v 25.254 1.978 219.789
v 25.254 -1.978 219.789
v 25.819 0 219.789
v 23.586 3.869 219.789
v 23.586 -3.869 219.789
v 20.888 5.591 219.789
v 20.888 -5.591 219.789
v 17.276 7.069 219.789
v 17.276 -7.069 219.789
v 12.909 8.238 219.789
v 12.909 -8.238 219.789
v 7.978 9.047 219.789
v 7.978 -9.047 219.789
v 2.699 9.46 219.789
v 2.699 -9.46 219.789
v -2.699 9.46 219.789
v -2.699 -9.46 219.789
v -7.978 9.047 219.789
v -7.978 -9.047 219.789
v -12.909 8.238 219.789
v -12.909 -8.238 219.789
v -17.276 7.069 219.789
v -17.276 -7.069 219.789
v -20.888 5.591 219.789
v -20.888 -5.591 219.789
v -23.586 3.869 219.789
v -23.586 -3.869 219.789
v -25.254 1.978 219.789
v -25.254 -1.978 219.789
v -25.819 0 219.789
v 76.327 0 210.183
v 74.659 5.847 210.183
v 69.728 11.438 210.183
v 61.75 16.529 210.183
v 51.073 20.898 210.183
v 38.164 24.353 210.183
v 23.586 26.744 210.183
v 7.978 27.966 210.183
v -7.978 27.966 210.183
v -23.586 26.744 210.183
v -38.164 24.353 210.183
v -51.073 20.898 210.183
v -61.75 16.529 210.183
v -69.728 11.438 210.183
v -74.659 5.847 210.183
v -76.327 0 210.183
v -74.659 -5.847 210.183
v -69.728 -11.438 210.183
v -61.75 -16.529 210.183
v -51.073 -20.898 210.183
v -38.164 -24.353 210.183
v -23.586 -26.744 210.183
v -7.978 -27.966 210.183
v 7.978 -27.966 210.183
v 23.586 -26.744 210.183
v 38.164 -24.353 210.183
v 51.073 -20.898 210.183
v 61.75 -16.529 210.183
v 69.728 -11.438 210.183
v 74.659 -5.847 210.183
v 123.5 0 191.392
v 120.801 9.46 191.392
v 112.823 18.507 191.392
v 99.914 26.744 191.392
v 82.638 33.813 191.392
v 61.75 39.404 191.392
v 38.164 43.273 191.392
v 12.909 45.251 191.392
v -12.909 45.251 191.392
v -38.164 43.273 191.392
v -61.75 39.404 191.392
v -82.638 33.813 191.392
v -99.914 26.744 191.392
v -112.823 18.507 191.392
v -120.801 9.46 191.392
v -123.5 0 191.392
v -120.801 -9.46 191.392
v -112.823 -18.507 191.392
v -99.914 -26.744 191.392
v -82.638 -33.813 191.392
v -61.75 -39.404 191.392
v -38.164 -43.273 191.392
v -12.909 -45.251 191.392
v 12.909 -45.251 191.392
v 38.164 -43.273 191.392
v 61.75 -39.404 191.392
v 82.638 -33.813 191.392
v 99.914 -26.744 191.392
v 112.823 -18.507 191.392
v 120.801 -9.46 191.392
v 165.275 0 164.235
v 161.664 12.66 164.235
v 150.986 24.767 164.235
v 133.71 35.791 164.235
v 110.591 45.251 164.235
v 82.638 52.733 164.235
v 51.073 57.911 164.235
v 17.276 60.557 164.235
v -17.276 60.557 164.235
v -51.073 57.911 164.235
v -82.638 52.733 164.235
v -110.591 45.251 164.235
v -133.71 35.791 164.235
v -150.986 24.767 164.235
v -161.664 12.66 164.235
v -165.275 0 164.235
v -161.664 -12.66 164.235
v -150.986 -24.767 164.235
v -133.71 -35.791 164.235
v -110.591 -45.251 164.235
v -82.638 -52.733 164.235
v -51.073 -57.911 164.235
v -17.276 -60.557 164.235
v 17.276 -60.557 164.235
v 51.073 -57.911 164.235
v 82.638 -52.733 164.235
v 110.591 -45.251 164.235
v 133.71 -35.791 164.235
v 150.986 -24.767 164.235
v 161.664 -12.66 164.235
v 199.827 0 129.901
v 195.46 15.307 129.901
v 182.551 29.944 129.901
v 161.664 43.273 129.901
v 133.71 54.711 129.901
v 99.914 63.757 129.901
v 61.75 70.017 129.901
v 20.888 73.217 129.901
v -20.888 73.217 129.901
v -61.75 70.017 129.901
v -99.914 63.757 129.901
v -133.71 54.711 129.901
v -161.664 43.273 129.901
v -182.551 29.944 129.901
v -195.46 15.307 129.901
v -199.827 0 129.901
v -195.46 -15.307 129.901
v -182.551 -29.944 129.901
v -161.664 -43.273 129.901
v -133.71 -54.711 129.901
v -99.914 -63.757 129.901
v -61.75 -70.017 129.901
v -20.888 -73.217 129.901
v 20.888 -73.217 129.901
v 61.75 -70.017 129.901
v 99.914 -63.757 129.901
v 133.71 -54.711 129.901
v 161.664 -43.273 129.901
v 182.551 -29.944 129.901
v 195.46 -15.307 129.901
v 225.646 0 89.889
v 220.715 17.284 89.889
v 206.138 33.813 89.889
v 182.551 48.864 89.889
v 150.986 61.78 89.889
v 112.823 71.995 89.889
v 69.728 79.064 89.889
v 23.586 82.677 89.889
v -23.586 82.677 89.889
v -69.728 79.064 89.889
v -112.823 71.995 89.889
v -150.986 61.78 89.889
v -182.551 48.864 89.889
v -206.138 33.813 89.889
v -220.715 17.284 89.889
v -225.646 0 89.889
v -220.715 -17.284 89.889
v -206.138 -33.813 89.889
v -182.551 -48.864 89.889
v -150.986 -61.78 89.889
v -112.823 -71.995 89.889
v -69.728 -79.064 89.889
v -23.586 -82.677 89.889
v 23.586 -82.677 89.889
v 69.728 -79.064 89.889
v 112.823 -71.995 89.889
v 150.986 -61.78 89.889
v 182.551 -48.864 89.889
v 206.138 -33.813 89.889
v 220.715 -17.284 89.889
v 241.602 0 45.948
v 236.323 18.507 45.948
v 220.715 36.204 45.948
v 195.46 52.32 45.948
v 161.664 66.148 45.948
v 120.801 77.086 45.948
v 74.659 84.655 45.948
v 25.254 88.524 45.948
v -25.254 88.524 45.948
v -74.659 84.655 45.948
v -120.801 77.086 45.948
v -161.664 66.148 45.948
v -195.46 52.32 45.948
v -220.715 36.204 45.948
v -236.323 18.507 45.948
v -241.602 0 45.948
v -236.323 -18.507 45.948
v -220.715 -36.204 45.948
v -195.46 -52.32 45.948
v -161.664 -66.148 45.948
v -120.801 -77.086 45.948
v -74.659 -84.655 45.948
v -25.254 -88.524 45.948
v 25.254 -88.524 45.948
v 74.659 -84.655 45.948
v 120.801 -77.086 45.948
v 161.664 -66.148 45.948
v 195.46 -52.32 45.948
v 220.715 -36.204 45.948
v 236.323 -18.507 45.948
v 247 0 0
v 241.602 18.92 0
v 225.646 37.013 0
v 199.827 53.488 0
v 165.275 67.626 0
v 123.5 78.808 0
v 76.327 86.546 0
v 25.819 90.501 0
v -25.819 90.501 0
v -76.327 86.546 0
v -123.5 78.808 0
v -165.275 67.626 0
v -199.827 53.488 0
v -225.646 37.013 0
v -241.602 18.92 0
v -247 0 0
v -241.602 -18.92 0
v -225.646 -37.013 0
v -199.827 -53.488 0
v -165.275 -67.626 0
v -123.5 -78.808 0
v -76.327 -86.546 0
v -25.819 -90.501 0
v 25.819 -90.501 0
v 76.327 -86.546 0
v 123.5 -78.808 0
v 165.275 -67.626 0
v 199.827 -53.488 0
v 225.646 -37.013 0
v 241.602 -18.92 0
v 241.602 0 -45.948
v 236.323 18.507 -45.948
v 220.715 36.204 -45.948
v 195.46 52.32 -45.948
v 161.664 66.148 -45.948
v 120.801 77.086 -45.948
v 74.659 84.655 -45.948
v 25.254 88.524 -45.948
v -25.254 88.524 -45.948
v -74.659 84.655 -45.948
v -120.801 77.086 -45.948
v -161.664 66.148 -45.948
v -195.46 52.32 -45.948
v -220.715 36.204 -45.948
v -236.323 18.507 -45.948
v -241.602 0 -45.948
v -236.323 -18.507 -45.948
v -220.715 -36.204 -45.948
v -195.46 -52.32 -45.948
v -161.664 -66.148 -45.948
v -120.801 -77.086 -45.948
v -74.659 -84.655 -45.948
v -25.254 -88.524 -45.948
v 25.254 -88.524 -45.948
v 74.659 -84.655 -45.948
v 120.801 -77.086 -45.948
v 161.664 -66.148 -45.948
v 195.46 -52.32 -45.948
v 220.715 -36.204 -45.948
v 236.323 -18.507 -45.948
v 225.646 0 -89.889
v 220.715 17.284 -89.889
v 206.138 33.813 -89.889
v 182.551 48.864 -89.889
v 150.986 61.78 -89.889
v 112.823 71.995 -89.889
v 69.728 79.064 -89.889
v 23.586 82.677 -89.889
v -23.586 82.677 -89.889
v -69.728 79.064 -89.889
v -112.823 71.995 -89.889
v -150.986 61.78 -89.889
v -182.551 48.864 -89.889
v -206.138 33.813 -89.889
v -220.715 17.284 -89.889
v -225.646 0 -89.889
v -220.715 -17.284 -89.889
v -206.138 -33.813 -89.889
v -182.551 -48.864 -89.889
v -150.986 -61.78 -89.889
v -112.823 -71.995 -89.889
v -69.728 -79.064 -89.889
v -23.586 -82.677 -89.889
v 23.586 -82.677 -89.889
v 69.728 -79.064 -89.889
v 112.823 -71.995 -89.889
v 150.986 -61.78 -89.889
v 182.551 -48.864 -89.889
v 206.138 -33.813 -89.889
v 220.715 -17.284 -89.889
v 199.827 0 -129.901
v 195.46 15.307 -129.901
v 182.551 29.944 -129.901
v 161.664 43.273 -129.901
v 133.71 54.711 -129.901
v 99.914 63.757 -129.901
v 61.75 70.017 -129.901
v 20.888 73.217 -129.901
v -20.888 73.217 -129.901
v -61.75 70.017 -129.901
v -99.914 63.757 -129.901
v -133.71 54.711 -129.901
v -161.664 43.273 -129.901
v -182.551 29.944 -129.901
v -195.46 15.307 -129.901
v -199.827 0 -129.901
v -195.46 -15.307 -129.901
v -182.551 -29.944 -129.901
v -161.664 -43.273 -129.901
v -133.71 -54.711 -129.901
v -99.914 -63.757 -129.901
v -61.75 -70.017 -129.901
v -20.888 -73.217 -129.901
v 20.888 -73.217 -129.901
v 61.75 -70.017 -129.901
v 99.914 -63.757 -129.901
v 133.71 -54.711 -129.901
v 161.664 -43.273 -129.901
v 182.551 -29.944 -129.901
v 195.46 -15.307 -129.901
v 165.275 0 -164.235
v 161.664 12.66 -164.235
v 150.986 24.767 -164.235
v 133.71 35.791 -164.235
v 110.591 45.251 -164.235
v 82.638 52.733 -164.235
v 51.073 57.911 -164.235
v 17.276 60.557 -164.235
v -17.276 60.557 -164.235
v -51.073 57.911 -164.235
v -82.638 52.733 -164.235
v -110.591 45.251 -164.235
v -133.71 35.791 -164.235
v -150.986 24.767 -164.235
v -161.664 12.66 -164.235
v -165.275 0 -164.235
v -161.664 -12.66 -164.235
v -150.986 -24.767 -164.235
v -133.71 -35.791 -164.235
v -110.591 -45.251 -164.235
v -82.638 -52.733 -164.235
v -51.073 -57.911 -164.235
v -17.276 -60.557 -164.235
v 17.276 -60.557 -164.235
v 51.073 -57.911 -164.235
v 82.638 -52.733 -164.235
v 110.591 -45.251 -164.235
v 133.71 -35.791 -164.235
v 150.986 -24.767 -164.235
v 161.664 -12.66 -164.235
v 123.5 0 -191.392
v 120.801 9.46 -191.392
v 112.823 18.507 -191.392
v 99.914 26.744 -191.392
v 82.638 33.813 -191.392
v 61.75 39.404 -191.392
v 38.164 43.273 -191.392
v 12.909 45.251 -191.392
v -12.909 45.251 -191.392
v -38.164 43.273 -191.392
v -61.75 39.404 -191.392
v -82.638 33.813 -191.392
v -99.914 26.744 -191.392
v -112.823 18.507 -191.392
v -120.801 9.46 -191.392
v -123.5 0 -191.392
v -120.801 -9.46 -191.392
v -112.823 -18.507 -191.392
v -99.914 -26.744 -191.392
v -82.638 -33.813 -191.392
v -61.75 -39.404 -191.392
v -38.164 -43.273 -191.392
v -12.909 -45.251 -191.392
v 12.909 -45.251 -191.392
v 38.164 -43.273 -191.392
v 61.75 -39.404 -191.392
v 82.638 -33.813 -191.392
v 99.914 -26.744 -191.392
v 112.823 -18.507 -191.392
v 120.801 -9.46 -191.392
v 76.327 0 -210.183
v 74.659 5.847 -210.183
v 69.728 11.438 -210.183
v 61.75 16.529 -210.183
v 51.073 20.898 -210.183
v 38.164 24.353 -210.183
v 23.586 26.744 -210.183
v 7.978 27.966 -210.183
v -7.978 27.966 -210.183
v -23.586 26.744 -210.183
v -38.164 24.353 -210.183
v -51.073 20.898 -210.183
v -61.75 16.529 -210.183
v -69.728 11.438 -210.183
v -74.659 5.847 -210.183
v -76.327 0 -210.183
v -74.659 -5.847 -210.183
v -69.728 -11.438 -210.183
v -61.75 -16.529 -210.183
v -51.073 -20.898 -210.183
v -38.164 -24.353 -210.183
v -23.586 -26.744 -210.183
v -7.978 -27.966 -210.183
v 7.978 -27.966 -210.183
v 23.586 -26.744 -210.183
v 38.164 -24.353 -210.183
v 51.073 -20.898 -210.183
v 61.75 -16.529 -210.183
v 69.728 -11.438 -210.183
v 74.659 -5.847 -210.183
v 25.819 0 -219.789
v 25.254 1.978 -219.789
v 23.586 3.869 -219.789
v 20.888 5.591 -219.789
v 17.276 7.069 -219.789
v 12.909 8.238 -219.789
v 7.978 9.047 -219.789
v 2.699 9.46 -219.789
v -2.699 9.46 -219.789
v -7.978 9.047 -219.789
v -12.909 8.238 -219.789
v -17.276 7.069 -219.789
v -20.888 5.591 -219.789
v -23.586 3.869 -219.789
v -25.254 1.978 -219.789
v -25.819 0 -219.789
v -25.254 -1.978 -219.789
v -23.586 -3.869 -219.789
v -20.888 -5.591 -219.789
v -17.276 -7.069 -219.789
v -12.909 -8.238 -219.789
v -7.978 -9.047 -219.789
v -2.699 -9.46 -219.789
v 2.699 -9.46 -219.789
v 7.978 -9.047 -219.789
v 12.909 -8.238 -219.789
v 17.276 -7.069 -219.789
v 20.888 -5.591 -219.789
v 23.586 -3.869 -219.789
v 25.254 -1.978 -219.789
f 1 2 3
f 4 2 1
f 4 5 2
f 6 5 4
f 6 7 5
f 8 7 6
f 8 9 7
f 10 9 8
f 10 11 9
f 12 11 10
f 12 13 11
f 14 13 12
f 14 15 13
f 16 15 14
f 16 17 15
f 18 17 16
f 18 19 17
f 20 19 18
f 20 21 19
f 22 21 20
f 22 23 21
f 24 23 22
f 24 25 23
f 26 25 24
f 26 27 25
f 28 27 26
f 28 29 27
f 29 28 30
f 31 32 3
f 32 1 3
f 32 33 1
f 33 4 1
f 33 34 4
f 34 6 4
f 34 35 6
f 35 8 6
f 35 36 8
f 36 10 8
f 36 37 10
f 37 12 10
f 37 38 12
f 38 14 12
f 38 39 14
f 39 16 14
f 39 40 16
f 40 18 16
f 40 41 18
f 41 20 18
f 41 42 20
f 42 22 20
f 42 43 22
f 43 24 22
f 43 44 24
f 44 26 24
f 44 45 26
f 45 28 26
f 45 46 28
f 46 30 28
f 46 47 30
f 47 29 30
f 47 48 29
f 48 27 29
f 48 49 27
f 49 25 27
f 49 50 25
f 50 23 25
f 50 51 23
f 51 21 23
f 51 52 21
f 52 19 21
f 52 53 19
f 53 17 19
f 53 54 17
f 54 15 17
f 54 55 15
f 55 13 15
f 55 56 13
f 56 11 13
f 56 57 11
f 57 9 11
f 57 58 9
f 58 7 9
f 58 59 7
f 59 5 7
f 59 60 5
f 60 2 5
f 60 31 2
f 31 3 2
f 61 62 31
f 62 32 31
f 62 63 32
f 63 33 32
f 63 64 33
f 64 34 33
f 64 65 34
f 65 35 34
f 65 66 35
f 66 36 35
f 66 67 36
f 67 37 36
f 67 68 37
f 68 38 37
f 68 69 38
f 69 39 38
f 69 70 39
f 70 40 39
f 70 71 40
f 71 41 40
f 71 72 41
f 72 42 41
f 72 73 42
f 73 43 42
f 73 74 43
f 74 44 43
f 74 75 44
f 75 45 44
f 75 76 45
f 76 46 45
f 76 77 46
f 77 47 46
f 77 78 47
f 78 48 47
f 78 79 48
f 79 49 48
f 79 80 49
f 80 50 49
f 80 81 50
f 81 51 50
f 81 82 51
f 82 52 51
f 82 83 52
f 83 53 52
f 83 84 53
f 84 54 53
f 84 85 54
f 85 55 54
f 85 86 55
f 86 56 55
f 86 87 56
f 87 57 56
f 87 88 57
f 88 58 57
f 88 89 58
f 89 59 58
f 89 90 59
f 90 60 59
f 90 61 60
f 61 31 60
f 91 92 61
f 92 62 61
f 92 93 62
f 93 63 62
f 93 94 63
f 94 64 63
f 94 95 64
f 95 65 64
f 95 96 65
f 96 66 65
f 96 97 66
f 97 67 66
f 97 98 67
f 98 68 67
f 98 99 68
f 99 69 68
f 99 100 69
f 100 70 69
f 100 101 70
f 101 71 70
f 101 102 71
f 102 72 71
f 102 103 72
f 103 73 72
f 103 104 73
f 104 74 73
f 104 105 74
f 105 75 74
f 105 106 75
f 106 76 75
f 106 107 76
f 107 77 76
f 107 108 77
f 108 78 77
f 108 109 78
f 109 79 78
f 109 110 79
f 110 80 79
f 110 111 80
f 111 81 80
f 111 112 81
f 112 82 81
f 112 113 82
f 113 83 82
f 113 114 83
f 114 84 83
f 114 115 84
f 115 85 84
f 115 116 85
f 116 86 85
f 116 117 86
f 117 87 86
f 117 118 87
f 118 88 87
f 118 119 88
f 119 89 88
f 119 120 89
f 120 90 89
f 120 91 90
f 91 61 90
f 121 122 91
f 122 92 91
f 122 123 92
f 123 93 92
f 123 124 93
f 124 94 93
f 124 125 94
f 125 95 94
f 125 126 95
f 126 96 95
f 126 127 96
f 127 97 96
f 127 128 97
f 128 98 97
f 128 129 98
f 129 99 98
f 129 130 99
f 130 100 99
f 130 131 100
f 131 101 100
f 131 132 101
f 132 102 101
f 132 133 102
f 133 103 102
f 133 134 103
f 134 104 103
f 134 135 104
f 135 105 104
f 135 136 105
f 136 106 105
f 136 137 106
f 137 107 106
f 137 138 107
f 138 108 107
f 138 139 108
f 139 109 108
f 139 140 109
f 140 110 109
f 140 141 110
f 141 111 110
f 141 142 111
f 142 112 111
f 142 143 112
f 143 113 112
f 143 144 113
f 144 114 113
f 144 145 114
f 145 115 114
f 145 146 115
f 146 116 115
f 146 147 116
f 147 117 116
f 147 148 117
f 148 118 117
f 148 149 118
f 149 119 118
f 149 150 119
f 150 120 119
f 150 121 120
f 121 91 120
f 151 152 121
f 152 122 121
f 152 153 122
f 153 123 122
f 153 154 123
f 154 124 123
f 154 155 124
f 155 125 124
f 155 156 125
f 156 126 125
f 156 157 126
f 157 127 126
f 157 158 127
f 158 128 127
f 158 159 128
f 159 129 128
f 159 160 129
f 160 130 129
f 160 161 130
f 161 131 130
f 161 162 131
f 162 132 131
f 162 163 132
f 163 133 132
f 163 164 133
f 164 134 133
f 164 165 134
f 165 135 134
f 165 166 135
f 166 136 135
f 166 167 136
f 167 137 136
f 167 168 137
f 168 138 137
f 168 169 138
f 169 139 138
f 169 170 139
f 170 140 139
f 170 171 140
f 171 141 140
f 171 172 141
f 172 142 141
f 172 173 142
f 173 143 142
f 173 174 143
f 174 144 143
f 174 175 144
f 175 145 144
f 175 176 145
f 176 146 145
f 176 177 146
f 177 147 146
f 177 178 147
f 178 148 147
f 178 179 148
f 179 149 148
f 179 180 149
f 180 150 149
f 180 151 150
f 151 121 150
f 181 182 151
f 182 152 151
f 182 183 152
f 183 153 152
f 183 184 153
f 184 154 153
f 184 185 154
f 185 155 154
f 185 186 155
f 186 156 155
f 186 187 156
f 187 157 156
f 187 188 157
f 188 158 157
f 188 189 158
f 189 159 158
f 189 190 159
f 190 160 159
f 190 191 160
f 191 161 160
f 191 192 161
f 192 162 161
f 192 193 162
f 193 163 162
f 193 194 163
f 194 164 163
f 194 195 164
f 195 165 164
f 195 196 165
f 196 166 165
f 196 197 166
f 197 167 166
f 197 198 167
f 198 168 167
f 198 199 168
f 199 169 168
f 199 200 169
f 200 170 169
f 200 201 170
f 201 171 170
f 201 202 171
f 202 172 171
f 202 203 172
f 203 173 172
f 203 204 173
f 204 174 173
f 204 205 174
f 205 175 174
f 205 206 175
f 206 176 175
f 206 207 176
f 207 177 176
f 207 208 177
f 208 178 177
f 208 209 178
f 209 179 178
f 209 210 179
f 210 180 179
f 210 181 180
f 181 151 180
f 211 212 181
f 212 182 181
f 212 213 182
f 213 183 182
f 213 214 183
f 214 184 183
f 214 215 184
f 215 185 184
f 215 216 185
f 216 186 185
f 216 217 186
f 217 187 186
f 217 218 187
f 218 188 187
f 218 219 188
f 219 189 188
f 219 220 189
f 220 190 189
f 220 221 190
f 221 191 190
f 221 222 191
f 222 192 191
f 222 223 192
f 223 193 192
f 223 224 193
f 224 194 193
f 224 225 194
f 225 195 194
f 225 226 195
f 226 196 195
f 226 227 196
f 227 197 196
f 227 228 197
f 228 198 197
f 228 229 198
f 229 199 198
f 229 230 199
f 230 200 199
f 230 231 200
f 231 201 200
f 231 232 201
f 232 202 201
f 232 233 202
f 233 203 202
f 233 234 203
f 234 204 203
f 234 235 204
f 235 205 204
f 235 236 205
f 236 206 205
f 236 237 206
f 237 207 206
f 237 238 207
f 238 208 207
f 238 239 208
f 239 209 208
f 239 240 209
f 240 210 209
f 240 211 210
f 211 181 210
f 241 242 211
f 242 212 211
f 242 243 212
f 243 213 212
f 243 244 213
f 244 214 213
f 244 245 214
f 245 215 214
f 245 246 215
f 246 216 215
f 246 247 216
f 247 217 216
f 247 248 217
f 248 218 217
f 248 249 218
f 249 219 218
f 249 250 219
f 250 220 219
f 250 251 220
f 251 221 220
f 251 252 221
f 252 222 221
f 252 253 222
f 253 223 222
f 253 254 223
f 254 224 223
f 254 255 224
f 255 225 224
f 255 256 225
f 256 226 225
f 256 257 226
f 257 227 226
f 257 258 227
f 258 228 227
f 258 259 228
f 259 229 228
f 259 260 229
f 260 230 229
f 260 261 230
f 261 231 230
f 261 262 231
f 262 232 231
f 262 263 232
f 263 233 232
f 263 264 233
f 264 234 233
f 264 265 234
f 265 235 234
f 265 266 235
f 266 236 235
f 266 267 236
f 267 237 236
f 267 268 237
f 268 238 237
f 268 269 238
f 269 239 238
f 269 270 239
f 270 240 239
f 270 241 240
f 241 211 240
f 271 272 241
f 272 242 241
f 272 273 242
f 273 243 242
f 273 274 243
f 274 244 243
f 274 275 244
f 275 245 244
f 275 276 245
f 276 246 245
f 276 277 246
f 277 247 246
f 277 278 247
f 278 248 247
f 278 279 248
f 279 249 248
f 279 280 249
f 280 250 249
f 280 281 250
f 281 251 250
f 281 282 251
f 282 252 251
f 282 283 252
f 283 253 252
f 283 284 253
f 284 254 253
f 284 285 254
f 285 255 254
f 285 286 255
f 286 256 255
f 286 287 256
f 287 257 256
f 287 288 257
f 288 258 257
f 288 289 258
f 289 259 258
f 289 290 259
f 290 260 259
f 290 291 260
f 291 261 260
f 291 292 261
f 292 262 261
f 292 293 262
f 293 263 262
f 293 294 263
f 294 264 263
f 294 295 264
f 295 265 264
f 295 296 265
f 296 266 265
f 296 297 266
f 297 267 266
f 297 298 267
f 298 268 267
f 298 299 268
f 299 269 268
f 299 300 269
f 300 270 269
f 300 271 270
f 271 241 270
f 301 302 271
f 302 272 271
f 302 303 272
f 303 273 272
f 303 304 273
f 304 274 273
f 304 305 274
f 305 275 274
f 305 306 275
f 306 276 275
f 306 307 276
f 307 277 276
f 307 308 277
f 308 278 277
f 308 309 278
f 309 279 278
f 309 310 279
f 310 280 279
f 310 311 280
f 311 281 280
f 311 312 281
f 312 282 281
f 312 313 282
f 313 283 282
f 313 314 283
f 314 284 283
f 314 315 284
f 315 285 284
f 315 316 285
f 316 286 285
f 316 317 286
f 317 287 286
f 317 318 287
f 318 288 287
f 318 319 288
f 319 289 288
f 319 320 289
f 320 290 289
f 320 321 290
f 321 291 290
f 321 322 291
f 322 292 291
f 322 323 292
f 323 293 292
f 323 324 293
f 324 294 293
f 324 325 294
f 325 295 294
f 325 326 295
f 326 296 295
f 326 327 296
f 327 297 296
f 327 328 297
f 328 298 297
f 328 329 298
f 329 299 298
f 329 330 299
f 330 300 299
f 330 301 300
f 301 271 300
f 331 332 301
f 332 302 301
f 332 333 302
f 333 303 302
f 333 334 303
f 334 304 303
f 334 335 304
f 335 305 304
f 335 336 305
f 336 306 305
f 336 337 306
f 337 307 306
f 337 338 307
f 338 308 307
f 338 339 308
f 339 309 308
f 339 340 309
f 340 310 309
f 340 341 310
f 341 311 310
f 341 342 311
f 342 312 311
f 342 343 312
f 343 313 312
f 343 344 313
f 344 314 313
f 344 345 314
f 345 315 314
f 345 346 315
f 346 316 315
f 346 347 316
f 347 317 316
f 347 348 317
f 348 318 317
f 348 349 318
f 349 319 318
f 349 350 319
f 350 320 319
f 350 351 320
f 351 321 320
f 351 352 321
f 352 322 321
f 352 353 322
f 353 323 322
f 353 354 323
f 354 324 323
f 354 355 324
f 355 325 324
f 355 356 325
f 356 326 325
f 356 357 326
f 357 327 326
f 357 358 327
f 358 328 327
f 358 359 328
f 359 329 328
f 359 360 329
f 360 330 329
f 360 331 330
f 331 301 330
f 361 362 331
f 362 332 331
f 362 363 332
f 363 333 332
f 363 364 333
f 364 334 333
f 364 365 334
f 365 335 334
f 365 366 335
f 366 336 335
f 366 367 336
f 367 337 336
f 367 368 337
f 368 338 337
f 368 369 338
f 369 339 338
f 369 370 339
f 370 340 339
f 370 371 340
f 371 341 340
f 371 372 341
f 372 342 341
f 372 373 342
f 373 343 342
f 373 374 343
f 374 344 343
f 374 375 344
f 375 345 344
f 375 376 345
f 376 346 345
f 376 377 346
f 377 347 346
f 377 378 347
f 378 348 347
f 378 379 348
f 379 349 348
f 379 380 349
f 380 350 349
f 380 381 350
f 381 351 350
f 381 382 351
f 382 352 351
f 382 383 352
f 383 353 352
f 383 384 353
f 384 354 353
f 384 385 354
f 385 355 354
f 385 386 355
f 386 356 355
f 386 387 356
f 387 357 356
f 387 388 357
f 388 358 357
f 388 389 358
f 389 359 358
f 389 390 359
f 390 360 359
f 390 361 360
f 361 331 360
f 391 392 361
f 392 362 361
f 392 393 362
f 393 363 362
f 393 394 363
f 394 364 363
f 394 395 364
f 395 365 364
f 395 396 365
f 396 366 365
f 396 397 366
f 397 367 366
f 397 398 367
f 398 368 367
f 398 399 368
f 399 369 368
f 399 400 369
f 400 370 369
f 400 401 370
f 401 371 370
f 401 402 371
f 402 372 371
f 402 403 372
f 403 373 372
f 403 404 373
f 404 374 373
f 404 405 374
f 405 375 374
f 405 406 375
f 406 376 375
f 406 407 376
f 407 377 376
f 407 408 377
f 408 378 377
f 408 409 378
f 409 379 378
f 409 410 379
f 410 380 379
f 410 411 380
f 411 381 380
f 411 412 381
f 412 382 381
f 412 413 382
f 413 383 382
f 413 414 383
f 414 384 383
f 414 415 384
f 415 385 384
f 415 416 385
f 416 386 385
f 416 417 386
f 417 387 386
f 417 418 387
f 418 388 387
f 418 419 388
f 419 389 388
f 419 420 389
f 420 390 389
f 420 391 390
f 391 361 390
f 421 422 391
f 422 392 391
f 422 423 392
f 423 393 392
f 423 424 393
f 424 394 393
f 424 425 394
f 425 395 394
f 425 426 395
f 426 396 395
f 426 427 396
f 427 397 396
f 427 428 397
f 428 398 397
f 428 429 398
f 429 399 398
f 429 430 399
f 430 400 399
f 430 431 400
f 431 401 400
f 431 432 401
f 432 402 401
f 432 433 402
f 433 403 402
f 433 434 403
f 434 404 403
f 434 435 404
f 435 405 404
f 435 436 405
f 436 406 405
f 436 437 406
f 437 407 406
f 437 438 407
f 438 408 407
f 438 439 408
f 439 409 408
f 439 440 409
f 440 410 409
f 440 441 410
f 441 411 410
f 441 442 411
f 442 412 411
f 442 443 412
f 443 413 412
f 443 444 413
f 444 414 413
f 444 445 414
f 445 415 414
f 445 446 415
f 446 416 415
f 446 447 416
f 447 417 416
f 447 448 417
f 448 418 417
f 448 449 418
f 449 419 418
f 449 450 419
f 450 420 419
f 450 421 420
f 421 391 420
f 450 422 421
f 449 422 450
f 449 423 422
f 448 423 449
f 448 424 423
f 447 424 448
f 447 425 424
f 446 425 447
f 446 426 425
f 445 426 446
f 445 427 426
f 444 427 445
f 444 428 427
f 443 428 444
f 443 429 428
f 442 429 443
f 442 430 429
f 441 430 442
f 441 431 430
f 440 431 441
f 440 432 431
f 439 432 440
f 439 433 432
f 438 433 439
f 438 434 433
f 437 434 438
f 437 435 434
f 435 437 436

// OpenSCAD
// Generated by SolidPython 1.0.1 on 2020-07-29 00:46:53


scale(v = [19, 7, 17]) {
	sphere(r = 13);
}
/***********************************************
*********      SolidPython code:      **********
************************************************
 
# import packages: SolidPython
from solid import *
from solid.utils import *
from itertools import chain, combinations, permutations


class Resize:

    def __init__(self, scad_file):
        self.scad_file = scad_file
        #self.scad_file = import_scad(scad_file)
        # cone/cylinder param:
        self.r1 = 0
        self.r2 = 0
        self.h = 0
        # rectangular prism param:
        self.w = 0
        self.l = 0
        # ellipse param:
        self.r = 0

    # import OpenScad code (file name corresponds to shape)


    # classify shape + parameters
    def assign(self, param1, param2, param3):
        if self.scad_file == 'cone.scad':
            self.r1 = param1
            self.r2 = param2
            self.h = param3
        elif self.scad_file == 'cylinder.scad':
            self.r1 = param1
            self.r2 = param2
            self.h = param3
        elif self.scad_file == 'rectangularPrism.scad':
            self.h = param1
            self.l = param2
            self.w = param3
        else:
            self.r = param1
            self.h = param2

    # resize parameters
    def iterate(self):
        x = range(3, 20, 2)
        i = 1
        if self.scad_file == 'cone.scad':
            tempList = list(permutations(x, 2))
            for temp in tempList:
                param1 = temp[0]
                param2 = temp[1]
                filepath = 'produced_scad_files/' + 'cone' + str(param1) + '_' + str(param2) + '_' + '.scad'
                scad_render_to_file(cylinder(h=param1, r1=param2, r2=0), filepath)

        elif self.scad_file == 'cylinder.scad':
            tempList = list(permutations(x, 3))
            for temp in tempList:
                param1 = temp[0]
                param2 = temp[1]
                filepath = 'produced_scad_files/' + 'cylinder' + str(param1) + '_' + str(param2) + '_' + '.scad'
                scad_render_to_file(cylinder(h=param1, r1=param2, r2=param2), filepath)

        elif self.scad_file == 'rectangularPrism.scad':
            tempList = list(permutations(x, 3))
            for temp in tempList:
                param1 = temp[0]
                param2 = temp[1]
                param3 = temp[2]
                filepath = 'produced_scad_files/' + 'rectangularPrism' + str(param1) + '_' + str(param2) + '_' + str(
                    param3) + '.scad'
                scad_render_to_file(cube(size=(param1, param2, param3)), filepath)

        elif self.scad_file == 'ellipse.scad':
            tempList = list(permutations(x, 4))
            for temp in tempList:
                param1 = temp[0]
                param2 = temp[1]
                param3 = temp[2]
                param4 = temp[3]
                filepath = 'produced_scad_files/' + 'ellipse' + str(param1) + '_' + str(param2) + '_' + str(param3) + '_' + str(param4) + '.scad'
                scad_render_to_file(scale([param1, param2, param3])(sphere(r=param4)), filepath)

    def render_to_scadfile(self):
        scad_render_to_file(scad, 'example.scad') 
 
************************************************/
